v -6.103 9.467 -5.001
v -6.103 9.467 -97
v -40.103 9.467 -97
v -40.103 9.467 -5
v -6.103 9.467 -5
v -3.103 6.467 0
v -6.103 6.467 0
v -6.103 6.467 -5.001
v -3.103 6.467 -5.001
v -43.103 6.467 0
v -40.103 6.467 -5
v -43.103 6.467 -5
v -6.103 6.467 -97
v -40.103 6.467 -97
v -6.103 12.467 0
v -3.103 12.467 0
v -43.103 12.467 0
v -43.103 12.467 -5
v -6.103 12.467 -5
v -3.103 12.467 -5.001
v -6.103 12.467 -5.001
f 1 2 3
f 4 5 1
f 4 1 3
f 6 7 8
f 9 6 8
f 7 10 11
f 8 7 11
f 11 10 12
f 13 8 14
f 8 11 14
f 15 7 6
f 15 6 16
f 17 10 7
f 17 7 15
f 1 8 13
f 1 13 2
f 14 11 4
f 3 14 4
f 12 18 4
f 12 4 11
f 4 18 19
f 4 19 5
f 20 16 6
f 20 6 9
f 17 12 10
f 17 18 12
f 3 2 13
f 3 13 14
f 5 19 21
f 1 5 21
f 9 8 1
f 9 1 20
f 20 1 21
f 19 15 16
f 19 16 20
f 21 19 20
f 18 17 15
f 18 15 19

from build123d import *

# Parameters (mm, degrees)
SKETCH1_W           = 34
SKETCH1_H           = 6
BOSS_EXTRUDE1_DEPTH = 5
SKETCH2_W           = 34
SKETCH2_H           = 3
BOSS_EXTRUDE2_DEPTH = 92
BOSS_EXTRUDE3_DEPTH = 3
SKETCH4_W           = 5.001426655
SKETCH4_H           = 6
BOSS_EXTRUDE4_DEPTH = 3


with BuildPart() as part:
    # Sketch1 → Boss-Extrude1 (new body)
    with BuildSketch(Plane.XY):
        with Locations((-23.102564103, 9.466666667)):
            Rectangle(SKETCH1_W, SKETCH1_H)
    extrude(amount=-BOSS_EXTRUDE1_DEPTH)

    # Sketch2 → Boss-Extrude2 (add)
    with BuildSketch(Plane(origin=(0, 0, -5), x_dir=(-1, 0, 0), z_dir=(0, 0, -1))):
        with Locations((23.102564103, 7.966666667)):
            Rectangle(SKETCH2_W, SKETCH2_H)
    extrude(amount=BOSS_EXTRUDE2_DEPTH)

    # Sketch3 → Boss-Extrude3 (add)
    with BuildSketch(Plane.ZY.offset(40.102564103)):
        Polygon((-5, 9.466666667), (-5, 6.466666667), (0, 6.466666667), (0, 12.466666667), (-5, 12.466666667), align=None)
    extrude(amount=BOSS_EXTRUDE3_DEPTH)

    # Sketch4 → Boss-Extrude4 (add)
    with BuildSketch(Plane(origin=(-6.102564103, 0, 0), x_dir=(0, 0, -1), z_dir=(1, 0, 0))):
        with Locations((2.500713328, 9.466666667)):
            Rectangle(SKETCH4_W, SKETCH4_H)
    extrude(amount=BOSS_EXTRUDE4_DEPTH)


solid = part.part
